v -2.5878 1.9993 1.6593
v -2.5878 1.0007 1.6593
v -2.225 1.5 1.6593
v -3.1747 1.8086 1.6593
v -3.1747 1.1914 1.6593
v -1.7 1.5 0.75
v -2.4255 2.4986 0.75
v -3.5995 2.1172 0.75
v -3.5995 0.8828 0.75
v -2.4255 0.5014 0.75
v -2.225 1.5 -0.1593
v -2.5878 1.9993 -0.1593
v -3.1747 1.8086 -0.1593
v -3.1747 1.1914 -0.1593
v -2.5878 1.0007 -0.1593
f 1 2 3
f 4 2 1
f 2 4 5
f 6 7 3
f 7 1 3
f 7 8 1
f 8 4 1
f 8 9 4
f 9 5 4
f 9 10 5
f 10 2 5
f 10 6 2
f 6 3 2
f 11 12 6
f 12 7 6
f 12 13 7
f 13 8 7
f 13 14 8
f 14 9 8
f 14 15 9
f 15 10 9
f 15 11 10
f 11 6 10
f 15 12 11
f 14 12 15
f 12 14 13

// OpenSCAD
union() {
  translate([-2.75, 1.5, 0.75]) sphere(r=1.05);
}
